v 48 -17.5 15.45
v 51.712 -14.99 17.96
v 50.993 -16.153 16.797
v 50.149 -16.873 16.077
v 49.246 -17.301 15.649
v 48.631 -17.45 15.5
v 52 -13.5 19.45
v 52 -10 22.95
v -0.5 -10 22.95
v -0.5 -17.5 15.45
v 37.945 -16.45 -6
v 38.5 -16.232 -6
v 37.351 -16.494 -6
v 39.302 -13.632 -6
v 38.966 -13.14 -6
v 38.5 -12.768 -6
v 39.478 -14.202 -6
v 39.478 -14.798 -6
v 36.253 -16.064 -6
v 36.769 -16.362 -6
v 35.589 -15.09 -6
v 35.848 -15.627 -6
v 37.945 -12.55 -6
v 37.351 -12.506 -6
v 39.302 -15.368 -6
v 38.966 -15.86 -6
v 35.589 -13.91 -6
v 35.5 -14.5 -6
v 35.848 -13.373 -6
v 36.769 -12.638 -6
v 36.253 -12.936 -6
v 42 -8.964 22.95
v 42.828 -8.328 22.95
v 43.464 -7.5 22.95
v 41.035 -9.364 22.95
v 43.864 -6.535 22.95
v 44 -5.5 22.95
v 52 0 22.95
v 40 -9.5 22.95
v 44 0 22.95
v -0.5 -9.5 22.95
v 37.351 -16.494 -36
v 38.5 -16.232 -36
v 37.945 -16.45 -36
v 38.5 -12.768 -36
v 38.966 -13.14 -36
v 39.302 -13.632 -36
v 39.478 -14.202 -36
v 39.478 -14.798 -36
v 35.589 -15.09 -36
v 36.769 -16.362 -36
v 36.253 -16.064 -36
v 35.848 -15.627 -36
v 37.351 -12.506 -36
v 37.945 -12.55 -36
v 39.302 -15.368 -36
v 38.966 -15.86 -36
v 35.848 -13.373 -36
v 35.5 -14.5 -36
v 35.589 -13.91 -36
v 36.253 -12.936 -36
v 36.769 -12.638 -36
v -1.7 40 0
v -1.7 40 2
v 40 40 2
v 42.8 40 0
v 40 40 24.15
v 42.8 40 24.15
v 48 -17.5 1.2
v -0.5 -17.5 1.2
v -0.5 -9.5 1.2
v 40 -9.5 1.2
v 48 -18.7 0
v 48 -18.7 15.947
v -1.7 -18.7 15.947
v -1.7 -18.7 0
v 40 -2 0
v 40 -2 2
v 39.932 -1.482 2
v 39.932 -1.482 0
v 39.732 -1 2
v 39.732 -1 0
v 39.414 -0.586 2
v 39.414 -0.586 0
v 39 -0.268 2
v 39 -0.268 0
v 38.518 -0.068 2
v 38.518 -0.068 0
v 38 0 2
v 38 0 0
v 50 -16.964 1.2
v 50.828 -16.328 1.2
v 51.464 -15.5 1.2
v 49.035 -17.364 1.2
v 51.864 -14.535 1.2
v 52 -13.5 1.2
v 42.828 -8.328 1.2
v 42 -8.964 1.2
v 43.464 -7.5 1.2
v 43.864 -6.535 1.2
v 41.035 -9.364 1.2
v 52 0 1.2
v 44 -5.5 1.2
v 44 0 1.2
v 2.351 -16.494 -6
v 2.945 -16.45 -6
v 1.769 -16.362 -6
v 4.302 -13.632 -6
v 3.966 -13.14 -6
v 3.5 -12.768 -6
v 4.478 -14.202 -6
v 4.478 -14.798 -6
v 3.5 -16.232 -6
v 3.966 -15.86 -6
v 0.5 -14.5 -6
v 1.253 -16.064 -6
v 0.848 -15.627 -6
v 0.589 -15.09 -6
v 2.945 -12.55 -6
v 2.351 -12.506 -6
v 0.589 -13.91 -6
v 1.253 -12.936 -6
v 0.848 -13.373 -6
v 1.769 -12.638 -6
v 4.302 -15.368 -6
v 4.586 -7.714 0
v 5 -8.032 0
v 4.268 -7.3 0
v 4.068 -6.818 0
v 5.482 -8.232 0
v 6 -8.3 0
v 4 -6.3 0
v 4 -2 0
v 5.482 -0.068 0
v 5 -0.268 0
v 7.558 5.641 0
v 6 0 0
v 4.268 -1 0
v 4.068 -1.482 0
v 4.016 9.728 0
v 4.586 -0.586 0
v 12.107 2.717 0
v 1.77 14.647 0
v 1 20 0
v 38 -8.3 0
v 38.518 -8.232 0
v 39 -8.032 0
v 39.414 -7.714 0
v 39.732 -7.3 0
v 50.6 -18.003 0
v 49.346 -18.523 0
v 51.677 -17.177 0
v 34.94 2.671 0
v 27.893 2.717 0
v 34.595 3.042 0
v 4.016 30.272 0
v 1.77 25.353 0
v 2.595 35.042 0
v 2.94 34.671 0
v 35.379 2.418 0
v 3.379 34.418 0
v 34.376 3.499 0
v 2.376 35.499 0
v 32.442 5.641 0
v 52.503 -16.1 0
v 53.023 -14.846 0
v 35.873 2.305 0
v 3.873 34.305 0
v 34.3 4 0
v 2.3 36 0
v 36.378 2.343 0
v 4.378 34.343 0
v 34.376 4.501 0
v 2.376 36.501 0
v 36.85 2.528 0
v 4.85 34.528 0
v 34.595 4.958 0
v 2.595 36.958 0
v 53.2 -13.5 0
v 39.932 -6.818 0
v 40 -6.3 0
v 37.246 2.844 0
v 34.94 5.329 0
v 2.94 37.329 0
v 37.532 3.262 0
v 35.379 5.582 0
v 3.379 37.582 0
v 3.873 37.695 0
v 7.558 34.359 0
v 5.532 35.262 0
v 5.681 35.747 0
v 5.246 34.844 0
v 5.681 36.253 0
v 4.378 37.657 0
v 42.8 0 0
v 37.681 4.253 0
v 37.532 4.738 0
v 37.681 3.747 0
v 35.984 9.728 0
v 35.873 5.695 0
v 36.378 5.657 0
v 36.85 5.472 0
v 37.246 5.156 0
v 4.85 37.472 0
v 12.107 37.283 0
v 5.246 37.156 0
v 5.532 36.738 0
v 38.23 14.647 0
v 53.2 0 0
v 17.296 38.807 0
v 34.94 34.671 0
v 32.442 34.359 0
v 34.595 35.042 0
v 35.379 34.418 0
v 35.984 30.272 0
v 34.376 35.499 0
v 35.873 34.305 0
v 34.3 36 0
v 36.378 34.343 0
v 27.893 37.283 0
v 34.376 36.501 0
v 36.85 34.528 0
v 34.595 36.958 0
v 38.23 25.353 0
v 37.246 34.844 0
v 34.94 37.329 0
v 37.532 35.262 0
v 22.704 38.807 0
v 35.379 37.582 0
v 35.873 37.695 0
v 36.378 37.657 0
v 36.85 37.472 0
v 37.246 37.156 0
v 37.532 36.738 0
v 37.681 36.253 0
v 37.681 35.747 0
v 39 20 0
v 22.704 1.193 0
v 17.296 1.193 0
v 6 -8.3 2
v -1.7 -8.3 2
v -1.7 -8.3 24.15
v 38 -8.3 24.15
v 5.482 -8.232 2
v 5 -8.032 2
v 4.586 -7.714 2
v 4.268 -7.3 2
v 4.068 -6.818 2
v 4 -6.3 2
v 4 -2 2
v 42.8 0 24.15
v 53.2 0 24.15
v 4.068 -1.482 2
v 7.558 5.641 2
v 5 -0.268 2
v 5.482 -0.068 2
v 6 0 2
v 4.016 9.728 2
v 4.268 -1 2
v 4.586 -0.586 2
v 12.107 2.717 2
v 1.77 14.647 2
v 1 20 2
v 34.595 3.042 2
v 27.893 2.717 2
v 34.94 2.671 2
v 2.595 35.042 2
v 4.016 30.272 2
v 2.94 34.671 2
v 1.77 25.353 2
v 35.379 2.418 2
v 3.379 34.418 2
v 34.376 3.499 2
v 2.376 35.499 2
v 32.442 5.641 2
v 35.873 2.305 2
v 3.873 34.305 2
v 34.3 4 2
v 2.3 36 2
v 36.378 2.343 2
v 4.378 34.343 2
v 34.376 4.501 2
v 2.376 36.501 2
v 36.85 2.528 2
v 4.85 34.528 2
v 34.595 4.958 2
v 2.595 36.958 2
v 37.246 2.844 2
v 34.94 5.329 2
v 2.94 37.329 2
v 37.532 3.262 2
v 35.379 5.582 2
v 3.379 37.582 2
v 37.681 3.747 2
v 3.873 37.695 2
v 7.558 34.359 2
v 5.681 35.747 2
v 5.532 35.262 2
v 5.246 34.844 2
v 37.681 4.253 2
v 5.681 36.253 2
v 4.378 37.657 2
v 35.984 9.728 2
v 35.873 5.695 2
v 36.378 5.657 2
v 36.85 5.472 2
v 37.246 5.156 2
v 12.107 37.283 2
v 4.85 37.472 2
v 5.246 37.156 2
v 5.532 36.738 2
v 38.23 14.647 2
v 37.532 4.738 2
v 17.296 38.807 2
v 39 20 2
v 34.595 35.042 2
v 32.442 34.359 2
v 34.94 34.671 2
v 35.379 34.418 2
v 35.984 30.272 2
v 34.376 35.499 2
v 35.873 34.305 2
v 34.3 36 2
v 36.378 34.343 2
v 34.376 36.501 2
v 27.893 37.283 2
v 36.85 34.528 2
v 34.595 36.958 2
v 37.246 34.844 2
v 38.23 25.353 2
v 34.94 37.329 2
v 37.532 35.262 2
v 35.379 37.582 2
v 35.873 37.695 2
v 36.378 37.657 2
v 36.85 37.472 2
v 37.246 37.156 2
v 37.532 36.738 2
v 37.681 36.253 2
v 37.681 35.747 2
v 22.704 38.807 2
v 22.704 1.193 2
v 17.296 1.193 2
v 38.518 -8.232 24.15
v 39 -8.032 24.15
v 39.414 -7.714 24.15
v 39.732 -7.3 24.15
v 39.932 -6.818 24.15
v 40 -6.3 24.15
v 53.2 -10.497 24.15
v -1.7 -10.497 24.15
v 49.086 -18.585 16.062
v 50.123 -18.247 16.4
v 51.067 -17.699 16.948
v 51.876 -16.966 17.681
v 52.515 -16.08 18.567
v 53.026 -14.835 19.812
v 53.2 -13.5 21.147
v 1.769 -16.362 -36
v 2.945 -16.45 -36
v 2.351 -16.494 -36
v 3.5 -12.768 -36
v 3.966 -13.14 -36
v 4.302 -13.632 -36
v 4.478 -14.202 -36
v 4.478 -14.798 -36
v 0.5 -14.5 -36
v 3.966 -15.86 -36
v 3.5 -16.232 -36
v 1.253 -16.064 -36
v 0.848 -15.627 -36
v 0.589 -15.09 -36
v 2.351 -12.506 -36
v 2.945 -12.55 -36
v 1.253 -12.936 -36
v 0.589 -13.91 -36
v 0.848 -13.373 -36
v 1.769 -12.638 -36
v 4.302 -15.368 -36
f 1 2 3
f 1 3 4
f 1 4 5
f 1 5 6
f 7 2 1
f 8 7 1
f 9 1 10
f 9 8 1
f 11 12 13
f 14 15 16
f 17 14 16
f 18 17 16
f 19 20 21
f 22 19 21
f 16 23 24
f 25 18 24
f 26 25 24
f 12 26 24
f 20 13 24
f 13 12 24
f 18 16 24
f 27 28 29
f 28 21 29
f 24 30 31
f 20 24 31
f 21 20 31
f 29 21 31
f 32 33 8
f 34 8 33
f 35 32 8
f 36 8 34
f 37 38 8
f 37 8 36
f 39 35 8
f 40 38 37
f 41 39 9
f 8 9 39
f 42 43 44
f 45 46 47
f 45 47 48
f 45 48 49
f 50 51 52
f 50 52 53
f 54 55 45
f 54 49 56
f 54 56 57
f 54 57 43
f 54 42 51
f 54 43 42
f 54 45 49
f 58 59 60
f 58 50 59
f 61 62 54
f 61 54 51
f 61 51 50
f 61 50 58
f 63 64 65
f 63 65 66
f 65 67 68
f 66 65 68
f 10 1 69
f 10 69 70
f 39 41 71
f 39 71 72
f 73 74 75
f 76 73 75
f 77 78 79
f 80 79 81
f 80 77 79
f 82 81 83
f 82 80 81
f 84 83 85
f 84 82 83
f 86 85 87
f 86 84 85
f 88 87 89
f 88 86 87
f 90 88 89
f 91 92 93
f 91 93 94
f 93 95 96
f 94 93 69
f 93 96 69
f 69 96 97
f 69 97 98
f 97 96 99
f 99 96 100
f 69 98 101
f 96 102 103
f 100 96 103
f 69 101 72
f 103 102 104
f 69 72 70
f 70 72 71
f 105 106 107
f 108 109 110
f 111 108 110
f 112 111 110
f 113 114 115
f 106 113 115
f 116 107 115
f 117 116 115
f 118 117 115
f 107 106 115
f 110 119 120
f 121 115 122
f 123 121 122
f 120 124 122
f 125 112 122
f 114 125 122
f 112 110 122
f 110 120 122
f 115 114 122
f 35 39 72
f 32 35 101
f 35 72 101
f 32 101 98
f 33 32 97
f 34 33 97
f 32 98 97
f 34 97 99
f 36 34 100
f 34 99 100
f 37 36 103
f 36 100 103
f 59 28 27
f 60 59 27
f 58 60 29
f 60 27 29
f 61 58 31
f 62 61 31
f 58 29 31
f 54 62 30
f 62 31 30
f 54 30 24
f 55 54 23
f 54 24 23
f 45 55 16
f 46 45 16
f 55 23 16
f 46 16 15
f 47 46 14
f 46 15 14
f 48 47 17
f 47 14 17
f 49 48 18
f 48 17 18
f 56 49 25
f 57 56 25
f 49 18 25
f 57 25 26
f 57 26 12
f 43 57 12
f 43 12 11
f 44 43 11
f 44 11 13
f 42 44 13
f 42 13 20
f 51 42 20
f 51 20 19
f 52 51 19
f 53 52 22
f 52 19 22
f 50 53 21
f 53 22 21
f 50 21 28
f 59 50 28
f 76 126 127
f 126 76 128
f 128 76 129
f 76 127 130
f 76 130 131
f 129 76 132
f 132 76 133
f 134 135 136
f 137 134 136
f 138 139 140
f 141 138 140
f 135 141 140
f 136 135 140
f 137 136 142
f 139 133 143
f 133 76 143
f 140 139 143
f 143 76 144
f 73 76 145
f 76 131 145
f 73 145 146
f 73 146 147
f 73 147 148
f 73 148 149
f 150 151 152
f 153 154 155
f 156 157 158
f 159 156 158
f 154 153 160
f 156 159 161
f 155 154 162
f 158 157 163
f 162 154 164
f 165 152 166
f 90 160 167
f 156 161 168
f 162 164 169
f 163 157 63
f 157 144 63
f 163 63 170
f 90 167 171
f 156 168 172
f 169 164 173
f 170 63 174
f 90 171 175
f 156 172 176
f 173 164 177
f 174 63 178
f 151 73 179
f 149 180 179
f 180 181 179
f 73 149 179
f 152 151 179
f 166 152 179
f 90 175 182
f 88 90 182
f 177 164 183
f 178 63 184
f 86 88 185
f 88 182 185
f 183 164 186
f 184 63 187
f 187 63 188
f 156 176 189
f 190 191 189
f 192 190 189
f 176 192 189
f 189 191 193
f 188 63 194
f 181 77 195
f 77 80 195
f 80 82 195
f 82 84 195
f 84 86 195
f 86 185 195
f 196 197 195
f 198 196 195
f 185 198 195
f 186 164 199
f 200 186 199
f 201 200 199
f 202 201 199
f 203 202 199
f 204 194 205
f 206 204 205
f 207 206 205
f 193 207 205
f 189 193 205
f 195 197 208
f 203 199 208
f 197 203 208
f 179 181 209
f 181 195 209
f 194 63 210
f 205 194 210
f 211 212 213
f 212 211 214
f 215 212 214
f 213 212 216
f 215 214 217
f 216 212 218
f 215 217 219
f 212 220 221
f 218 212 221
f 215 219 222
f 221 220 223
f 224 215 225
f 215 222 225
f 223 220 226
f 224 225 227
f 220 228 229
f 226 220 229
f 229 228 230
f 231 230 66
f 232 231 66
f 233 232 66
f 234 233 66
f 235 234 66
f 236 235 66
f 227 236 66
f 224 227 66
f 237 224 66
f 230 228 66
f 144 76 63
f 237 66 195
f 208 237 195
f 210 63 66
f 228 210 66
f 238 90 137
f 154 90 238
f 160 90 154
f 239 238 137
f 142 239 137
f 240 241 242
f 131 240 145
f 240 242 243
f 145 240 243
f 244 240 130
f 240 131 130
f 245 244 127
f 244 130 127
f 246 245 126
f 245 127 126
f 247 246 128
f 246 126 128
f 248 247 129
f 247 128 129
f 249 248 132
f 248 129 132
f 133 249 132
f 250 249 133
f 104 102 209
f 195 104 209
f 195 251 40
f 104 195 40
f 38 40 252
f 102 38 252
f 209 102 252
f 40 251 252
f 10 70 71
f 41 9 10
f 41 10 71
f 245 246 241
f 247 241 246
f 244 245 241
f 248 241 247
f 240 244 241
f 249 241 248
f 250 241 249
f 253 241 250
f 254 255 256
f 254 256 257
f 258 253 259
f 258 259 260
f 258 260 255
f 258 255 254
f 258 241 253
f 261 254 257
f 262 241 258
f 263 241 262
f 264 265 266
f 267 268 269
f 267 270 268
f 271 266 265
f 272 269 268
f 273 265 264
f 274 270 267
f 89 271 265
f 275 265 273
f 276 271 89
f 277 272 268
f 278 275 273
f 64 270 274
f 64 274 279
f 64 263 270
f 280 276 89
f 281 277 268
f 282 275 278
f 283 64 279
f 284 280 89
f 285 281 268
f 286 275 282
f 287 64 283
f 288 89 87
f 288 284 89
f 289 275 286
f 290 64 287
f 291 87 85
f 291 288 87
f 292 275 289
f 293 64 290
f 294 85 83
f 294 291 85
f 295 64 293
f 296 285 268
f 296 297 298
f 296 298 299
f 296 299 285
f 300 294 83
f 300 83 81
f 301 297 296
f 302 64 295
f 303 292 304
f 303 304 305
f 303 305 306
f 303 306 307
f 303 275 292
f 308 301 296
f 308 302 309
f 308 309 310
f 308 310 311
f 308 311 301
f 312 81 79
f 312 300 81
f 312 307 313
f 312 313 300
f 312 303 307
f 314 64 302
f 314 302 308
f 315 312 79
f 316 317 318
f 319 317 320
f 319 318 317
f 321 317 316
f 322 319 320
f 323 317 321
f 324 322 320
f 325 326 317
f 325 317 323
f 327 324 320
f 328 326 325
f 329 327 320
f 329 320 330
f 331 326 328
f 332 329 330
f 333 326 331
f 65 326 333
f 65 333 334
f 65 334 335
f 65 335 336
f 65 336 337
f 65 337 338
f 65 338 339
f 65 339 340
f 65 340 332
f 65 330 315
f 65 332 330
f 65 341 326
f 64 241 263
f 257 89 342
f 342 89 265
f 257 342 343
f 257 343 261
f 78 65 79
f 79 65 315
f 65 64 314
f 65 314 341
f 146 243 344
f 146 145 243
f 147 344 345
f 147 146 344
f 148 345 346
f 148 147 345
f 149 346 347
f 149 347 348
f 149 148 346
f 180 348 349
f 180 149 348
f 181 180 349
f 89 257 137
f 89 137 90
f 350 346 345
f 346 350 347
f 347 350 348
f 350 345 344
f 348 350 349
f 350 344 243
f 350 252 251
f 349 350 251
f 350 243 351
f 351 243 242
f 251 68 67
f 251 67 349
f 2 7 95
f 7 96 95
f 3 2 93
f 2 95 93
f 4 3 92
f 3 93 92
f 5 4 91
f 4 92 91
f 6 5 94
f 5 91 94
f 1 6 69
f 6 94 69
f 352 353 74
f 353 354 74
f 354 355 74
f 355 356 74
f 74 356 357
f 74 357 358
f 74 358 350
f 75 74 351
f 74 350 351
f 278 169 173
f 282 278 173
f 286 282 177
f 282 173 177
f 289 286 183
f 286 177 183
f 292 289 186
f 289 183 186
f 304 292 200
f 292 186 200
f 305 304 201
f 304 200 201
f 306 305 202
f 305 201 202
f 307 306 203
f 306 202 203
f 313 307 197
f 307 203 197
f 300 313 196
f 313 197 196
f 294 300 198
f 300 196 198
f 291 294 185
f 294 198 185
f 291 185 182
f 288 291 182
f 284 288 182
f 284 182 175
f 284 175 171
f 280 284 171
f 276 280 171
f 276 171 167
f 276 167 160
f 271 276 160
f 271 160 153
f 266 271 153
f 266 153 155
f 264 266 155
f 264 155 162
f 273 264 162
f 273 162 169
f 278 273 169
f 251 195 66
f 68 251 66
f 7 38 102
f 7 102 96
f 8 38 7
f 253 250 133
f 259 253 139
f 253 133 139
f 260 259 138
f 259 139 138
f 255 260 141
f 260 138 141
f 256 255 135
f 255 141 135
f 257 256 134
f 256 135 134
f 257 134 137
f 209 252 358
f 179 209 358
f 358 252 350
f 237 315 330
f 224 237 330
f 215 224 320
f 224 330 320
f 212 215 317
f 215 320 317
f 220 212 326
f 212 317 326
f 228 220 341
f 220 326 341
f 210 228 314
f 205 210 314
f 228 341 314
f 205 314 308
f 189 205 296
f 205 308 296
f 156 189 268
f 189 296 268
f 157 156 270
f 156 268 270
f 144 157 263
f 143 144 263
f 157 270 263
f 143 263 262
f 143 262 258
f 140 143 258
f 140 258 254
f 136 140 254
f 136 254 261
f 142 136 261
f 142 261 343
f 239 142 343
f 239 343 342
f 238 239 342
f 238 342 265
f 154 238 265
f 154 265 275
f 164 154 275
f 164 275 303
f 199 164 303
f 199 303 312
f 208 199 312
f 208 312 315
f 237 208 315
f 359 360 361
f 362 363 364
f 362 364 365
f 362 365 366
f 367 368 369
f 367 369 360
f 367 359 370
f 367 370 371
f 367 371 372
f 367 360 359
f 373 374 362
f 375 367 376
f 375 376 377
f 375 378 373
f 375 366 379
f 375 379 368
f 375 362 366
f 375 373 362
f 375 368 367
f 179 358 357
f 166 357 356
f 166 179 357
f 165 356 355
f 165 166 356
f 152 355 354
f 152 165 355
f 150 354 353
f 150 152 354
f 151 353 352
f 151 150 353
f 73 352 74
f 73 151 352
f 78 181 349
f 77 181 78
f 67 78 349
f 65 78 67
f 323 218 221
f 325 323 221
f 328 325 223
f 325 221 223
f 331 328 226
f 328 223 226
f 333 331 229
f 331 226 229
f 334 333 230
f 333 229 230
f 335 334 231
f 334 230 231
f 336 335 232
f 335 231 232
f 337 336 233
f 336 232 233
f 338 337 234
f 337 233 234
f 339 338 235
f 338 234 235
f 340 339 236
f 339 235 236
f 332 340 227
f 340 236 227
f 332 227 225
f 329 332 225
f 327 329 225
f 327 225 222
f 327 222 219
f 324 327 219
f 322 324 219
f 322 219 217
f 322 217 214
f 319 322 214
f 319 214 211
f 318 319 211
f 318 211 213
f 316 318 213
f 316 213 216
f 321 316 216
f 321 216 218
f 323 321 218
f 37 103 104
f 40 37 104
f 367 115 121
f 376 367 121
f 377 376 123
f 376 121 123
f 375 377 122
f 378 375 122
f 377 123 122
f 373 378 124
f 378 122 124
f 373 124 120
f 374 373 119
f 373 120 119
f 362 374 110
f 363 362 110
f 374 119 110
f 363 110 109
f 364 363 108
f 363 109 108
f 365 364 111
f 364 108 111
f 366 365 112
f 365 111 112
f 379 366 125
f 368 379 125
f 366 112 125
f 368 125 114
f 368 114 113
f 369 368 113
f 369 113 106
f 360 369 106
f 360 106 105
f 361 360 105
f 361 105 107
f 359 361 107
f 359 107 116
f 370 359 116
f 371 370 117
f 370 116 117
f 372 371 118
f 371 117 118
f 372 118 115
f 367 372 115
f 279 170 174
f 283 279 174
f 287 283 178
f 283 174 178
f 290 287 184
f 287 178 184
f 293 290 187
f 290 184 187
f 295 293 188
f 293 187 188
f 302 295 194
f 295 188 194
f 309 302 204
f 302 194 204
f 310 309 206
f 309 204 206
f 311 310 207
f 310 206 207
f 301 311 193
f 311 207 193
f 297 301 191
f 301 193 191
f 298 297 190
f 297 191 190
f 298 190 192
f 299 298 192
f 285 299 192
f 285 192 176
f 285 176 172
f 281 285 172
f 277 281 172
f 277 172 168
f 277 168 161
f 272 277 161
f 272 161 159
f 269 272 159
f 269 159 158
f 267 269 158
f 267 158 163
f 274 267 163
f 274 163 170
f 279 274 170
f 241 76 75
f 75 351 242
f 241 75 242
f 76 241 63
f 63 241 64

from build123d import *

# Parameters (mm, degrees)
SKETCH1_W              = 40
SKETCH1_H              = 40
BOSS_EXTRUDE1_DEPTH    = 2
M3_CLEARANCE_HOLE1_D   = 3.4
SKETCH10_W             = 40
SKETCH10_H             = 8.3
BOSS_EXTRUDE7_DEPTH    = 2
BOSS_EXTRUDE10_START   = 6
SKETCH20_R             = 2
BOSS_EXTRUDE10_DEPTH   = 30
BOSS_EXTRUDE10_2_DEPTH = 30
BOSS_EXTRUDE11_DEPTH   = 21.75
CHAMFER1_SIZE          = 7.5
FILLET1_R              = 4
SHELL1_T               = 1.2
SKETCH25_W             = 2.8
SKETCH25_H             = 48.3
BOSS_EXTRUDE14_DEPTH   = 24.15
SKETCH26_W             = 36
SKETCH26_H             = 8.3
CUT_EXTRUDE5_DEPTH     = 77.64359073
SKETCH27_R             = 19
CUT_EXTRUDE6_DEPTH     = 77.64359073
FILLET2_R              = 2
FILLET3_R              = 2
SKETCH29_W             = 1.7
SKETCH29_H             = 48.3
BOSS_EXTRUDE15_DEPTH   = 2
DELETEFACE1_OUTLINE_R  = 1.7
DELETEFACE1_DEPTH      = 2


# Read off the part's stored shape, not the designer's step: DeleteFace1
with BuildPart() as part:
    # Sketch1 → Boss-Extrude1 (new body)
    with BuildSketch(Plane.XY):
        with Locations((20, 20)):
            Rectangle(SKETCH1_W, SKETCH1_H)
    extrude(amount=BOSS_EXTRUDE1_DEPTH)

    # M3 Clearance Hole1 (through all)
    with Locations(Plane.XY.offset(2)):
        with Locations((4, 36), (36, 4), (4, 4), (36, 36)):
            Hole(M3_CLEARANCE_HOLE1_D / 2)

    # Sketch10 → Boss-Extrude7 (add)
    with BuildSketch(Plane.XY.offset(2)):
        with Locations((20, -4.15)):
            Rectangle(SKETCH10_W, SKETCH10_H)
    extrude(amount=-BOSS_EXTRUDE7_DEPTH)



with BuildPart() as body_2:
    # Sketch20 → Boss-Extrude10 (new body)
    with BuildSketch(Plane(origin=(0, 0, 0), x_dir=(-1, 0, 0), z_dir=(0, 0, -1)).offset(BOSS_EXTRUDE10_START)):
        with Locations((-37.5, -14.5)):
            Circle(SKETCH20_R)
    extrude(amount=BOSS_EXTRUDE10_DEPTH)


with BuildPart() as body_3:
    # Sketch20 → Boss-Extrude10 2 (new body)
    with BuildSketch(Plane(origin=(0, 0, 0), x_dir=(-1, 0, 0), z_dir=(0, 0, -1)).offset(BOSS_EXTRUDE10_START)):
        with Locations((-2.5, -14.5)):
            Circle(SKETCH20_R)
    extrude(amount=BOSS_EXTRUDE10_2_DEPTH)


with BuildPart() as body_4:
    # Sketch22 → Boss-Extrude11 (new body)
    with BuildSketch(Plane(origin=(0, 0, 22.95), x_dir=(-1, 0, 0), z_dir=(0, 0, -1))):
        Polygon((-44, 0), (-52, 0), (-52, -17.5), (0.5, -17.5), (0.5, -9.5), (-44, -9.5), align=None)
    extrude(amount=BOSS_EXTRUDE11_DEPTH)

    # Chamfer1
    chamfer1_edges = [body_4.edges().sort_by_distance(p)[0] for p in [
        (25.75, -17.5, 22.95),
    ]]
    chamfer(chamfer1_edges, length=CHAMFER1_SIZE)

    # Fillet1
    fillet1_edges = [body_4.edges().sort_by_distance(p)[0] for p in [
        (44, -9.5, 12.075),
        (52, -17.5, 8.325),
    ]]
    fillet(fillet1_edges, radius=FILLET1_R)

    # Shell1
    shell1_openings = [body_4.faces().sort_by_distance(p)[0] for p in [
        (48, 0, 12.075),
    ]]
    offset(amount=SHELL1_T, openings=shell1_openings, kind=Kind.INTERSECTION)


with BuildPart() as part_1:
    add(part.part)

    add(body_4.part)  # Boss-Extrude14 merges body 4
    # Sketch25 → Boss-Extrude14 (add)
    with BuildSketch(Plane(origin=(0, 0, 0), x_dir=(-1, 0, 0), z_dir=(0, 0, -1))):
        with Locations((-41.4, 15.85)):
            Rectangle(SKETCH25_W, SKETCH25_H)
    extrude(amount=-BOSS_EXTRUDE14_DEPTH)

    # Sketch26 → Cut-Extrude5 (cut, through all)
    with BuildSketch(Plane.XY.offset(2)):
        with Locations((22, -4.15)):
            Rectangle(SKETCH26_W, SKETCH26_H)
    extrude(amount=-CUT_EXTRUDE5_DEPTH, mode=Mode.SUBTRACT)

    # Sketch27 → Cut-Extrude6 (cut, through all)
    with BuildSketch(Plane.XY.offset(2)):
        with Locations((20, 20)):
            Circle(SKETCH27_R)
    extrude(amount=-CUT_EXTRUDE6_DEPTH, mode=Mode.SUBTRACT)

    # Fillet2
    fillet2_edges = [part_1.edges().sort_by_distance(p)[0] for p in [
        (4, 0, 1),
        (40, 0, 1),
        (4, -8.3, 1),
    ]]
    fillet(fillet2_edges, radius=FILLET2_R)

    # Fillet3
    fillet3_edges = [part_1.edges().sort_by_distance(p)[0] for p in [
        (40, -8.3, 12.075),
    ]]
    fillet(fillet3_edges, radius=FILLET3_R)

    # Sketch29 → Boss-Extrude15 (add)
    with BuildSketch(Plane.XY.offset(2)):
        with Locations((-0.85, 15.85)):
            Rectangle(SKETCH29_W, SKETCH29_H)
    extrude(amount=-BOSS_EXTRUDE15_DEPTH)

    # DeleteFace1 outline → DeleteFace1 (add)
    with BuildSketch(Plane.XY):
        with Locations((4, 4)):
            Circle(DELETEFACE1_OUTLINE_R)
    extrude(amount=DELETEFACE1_DEPTH)


solid = Compound([body_2.part, body_3.part, part_1.part])
